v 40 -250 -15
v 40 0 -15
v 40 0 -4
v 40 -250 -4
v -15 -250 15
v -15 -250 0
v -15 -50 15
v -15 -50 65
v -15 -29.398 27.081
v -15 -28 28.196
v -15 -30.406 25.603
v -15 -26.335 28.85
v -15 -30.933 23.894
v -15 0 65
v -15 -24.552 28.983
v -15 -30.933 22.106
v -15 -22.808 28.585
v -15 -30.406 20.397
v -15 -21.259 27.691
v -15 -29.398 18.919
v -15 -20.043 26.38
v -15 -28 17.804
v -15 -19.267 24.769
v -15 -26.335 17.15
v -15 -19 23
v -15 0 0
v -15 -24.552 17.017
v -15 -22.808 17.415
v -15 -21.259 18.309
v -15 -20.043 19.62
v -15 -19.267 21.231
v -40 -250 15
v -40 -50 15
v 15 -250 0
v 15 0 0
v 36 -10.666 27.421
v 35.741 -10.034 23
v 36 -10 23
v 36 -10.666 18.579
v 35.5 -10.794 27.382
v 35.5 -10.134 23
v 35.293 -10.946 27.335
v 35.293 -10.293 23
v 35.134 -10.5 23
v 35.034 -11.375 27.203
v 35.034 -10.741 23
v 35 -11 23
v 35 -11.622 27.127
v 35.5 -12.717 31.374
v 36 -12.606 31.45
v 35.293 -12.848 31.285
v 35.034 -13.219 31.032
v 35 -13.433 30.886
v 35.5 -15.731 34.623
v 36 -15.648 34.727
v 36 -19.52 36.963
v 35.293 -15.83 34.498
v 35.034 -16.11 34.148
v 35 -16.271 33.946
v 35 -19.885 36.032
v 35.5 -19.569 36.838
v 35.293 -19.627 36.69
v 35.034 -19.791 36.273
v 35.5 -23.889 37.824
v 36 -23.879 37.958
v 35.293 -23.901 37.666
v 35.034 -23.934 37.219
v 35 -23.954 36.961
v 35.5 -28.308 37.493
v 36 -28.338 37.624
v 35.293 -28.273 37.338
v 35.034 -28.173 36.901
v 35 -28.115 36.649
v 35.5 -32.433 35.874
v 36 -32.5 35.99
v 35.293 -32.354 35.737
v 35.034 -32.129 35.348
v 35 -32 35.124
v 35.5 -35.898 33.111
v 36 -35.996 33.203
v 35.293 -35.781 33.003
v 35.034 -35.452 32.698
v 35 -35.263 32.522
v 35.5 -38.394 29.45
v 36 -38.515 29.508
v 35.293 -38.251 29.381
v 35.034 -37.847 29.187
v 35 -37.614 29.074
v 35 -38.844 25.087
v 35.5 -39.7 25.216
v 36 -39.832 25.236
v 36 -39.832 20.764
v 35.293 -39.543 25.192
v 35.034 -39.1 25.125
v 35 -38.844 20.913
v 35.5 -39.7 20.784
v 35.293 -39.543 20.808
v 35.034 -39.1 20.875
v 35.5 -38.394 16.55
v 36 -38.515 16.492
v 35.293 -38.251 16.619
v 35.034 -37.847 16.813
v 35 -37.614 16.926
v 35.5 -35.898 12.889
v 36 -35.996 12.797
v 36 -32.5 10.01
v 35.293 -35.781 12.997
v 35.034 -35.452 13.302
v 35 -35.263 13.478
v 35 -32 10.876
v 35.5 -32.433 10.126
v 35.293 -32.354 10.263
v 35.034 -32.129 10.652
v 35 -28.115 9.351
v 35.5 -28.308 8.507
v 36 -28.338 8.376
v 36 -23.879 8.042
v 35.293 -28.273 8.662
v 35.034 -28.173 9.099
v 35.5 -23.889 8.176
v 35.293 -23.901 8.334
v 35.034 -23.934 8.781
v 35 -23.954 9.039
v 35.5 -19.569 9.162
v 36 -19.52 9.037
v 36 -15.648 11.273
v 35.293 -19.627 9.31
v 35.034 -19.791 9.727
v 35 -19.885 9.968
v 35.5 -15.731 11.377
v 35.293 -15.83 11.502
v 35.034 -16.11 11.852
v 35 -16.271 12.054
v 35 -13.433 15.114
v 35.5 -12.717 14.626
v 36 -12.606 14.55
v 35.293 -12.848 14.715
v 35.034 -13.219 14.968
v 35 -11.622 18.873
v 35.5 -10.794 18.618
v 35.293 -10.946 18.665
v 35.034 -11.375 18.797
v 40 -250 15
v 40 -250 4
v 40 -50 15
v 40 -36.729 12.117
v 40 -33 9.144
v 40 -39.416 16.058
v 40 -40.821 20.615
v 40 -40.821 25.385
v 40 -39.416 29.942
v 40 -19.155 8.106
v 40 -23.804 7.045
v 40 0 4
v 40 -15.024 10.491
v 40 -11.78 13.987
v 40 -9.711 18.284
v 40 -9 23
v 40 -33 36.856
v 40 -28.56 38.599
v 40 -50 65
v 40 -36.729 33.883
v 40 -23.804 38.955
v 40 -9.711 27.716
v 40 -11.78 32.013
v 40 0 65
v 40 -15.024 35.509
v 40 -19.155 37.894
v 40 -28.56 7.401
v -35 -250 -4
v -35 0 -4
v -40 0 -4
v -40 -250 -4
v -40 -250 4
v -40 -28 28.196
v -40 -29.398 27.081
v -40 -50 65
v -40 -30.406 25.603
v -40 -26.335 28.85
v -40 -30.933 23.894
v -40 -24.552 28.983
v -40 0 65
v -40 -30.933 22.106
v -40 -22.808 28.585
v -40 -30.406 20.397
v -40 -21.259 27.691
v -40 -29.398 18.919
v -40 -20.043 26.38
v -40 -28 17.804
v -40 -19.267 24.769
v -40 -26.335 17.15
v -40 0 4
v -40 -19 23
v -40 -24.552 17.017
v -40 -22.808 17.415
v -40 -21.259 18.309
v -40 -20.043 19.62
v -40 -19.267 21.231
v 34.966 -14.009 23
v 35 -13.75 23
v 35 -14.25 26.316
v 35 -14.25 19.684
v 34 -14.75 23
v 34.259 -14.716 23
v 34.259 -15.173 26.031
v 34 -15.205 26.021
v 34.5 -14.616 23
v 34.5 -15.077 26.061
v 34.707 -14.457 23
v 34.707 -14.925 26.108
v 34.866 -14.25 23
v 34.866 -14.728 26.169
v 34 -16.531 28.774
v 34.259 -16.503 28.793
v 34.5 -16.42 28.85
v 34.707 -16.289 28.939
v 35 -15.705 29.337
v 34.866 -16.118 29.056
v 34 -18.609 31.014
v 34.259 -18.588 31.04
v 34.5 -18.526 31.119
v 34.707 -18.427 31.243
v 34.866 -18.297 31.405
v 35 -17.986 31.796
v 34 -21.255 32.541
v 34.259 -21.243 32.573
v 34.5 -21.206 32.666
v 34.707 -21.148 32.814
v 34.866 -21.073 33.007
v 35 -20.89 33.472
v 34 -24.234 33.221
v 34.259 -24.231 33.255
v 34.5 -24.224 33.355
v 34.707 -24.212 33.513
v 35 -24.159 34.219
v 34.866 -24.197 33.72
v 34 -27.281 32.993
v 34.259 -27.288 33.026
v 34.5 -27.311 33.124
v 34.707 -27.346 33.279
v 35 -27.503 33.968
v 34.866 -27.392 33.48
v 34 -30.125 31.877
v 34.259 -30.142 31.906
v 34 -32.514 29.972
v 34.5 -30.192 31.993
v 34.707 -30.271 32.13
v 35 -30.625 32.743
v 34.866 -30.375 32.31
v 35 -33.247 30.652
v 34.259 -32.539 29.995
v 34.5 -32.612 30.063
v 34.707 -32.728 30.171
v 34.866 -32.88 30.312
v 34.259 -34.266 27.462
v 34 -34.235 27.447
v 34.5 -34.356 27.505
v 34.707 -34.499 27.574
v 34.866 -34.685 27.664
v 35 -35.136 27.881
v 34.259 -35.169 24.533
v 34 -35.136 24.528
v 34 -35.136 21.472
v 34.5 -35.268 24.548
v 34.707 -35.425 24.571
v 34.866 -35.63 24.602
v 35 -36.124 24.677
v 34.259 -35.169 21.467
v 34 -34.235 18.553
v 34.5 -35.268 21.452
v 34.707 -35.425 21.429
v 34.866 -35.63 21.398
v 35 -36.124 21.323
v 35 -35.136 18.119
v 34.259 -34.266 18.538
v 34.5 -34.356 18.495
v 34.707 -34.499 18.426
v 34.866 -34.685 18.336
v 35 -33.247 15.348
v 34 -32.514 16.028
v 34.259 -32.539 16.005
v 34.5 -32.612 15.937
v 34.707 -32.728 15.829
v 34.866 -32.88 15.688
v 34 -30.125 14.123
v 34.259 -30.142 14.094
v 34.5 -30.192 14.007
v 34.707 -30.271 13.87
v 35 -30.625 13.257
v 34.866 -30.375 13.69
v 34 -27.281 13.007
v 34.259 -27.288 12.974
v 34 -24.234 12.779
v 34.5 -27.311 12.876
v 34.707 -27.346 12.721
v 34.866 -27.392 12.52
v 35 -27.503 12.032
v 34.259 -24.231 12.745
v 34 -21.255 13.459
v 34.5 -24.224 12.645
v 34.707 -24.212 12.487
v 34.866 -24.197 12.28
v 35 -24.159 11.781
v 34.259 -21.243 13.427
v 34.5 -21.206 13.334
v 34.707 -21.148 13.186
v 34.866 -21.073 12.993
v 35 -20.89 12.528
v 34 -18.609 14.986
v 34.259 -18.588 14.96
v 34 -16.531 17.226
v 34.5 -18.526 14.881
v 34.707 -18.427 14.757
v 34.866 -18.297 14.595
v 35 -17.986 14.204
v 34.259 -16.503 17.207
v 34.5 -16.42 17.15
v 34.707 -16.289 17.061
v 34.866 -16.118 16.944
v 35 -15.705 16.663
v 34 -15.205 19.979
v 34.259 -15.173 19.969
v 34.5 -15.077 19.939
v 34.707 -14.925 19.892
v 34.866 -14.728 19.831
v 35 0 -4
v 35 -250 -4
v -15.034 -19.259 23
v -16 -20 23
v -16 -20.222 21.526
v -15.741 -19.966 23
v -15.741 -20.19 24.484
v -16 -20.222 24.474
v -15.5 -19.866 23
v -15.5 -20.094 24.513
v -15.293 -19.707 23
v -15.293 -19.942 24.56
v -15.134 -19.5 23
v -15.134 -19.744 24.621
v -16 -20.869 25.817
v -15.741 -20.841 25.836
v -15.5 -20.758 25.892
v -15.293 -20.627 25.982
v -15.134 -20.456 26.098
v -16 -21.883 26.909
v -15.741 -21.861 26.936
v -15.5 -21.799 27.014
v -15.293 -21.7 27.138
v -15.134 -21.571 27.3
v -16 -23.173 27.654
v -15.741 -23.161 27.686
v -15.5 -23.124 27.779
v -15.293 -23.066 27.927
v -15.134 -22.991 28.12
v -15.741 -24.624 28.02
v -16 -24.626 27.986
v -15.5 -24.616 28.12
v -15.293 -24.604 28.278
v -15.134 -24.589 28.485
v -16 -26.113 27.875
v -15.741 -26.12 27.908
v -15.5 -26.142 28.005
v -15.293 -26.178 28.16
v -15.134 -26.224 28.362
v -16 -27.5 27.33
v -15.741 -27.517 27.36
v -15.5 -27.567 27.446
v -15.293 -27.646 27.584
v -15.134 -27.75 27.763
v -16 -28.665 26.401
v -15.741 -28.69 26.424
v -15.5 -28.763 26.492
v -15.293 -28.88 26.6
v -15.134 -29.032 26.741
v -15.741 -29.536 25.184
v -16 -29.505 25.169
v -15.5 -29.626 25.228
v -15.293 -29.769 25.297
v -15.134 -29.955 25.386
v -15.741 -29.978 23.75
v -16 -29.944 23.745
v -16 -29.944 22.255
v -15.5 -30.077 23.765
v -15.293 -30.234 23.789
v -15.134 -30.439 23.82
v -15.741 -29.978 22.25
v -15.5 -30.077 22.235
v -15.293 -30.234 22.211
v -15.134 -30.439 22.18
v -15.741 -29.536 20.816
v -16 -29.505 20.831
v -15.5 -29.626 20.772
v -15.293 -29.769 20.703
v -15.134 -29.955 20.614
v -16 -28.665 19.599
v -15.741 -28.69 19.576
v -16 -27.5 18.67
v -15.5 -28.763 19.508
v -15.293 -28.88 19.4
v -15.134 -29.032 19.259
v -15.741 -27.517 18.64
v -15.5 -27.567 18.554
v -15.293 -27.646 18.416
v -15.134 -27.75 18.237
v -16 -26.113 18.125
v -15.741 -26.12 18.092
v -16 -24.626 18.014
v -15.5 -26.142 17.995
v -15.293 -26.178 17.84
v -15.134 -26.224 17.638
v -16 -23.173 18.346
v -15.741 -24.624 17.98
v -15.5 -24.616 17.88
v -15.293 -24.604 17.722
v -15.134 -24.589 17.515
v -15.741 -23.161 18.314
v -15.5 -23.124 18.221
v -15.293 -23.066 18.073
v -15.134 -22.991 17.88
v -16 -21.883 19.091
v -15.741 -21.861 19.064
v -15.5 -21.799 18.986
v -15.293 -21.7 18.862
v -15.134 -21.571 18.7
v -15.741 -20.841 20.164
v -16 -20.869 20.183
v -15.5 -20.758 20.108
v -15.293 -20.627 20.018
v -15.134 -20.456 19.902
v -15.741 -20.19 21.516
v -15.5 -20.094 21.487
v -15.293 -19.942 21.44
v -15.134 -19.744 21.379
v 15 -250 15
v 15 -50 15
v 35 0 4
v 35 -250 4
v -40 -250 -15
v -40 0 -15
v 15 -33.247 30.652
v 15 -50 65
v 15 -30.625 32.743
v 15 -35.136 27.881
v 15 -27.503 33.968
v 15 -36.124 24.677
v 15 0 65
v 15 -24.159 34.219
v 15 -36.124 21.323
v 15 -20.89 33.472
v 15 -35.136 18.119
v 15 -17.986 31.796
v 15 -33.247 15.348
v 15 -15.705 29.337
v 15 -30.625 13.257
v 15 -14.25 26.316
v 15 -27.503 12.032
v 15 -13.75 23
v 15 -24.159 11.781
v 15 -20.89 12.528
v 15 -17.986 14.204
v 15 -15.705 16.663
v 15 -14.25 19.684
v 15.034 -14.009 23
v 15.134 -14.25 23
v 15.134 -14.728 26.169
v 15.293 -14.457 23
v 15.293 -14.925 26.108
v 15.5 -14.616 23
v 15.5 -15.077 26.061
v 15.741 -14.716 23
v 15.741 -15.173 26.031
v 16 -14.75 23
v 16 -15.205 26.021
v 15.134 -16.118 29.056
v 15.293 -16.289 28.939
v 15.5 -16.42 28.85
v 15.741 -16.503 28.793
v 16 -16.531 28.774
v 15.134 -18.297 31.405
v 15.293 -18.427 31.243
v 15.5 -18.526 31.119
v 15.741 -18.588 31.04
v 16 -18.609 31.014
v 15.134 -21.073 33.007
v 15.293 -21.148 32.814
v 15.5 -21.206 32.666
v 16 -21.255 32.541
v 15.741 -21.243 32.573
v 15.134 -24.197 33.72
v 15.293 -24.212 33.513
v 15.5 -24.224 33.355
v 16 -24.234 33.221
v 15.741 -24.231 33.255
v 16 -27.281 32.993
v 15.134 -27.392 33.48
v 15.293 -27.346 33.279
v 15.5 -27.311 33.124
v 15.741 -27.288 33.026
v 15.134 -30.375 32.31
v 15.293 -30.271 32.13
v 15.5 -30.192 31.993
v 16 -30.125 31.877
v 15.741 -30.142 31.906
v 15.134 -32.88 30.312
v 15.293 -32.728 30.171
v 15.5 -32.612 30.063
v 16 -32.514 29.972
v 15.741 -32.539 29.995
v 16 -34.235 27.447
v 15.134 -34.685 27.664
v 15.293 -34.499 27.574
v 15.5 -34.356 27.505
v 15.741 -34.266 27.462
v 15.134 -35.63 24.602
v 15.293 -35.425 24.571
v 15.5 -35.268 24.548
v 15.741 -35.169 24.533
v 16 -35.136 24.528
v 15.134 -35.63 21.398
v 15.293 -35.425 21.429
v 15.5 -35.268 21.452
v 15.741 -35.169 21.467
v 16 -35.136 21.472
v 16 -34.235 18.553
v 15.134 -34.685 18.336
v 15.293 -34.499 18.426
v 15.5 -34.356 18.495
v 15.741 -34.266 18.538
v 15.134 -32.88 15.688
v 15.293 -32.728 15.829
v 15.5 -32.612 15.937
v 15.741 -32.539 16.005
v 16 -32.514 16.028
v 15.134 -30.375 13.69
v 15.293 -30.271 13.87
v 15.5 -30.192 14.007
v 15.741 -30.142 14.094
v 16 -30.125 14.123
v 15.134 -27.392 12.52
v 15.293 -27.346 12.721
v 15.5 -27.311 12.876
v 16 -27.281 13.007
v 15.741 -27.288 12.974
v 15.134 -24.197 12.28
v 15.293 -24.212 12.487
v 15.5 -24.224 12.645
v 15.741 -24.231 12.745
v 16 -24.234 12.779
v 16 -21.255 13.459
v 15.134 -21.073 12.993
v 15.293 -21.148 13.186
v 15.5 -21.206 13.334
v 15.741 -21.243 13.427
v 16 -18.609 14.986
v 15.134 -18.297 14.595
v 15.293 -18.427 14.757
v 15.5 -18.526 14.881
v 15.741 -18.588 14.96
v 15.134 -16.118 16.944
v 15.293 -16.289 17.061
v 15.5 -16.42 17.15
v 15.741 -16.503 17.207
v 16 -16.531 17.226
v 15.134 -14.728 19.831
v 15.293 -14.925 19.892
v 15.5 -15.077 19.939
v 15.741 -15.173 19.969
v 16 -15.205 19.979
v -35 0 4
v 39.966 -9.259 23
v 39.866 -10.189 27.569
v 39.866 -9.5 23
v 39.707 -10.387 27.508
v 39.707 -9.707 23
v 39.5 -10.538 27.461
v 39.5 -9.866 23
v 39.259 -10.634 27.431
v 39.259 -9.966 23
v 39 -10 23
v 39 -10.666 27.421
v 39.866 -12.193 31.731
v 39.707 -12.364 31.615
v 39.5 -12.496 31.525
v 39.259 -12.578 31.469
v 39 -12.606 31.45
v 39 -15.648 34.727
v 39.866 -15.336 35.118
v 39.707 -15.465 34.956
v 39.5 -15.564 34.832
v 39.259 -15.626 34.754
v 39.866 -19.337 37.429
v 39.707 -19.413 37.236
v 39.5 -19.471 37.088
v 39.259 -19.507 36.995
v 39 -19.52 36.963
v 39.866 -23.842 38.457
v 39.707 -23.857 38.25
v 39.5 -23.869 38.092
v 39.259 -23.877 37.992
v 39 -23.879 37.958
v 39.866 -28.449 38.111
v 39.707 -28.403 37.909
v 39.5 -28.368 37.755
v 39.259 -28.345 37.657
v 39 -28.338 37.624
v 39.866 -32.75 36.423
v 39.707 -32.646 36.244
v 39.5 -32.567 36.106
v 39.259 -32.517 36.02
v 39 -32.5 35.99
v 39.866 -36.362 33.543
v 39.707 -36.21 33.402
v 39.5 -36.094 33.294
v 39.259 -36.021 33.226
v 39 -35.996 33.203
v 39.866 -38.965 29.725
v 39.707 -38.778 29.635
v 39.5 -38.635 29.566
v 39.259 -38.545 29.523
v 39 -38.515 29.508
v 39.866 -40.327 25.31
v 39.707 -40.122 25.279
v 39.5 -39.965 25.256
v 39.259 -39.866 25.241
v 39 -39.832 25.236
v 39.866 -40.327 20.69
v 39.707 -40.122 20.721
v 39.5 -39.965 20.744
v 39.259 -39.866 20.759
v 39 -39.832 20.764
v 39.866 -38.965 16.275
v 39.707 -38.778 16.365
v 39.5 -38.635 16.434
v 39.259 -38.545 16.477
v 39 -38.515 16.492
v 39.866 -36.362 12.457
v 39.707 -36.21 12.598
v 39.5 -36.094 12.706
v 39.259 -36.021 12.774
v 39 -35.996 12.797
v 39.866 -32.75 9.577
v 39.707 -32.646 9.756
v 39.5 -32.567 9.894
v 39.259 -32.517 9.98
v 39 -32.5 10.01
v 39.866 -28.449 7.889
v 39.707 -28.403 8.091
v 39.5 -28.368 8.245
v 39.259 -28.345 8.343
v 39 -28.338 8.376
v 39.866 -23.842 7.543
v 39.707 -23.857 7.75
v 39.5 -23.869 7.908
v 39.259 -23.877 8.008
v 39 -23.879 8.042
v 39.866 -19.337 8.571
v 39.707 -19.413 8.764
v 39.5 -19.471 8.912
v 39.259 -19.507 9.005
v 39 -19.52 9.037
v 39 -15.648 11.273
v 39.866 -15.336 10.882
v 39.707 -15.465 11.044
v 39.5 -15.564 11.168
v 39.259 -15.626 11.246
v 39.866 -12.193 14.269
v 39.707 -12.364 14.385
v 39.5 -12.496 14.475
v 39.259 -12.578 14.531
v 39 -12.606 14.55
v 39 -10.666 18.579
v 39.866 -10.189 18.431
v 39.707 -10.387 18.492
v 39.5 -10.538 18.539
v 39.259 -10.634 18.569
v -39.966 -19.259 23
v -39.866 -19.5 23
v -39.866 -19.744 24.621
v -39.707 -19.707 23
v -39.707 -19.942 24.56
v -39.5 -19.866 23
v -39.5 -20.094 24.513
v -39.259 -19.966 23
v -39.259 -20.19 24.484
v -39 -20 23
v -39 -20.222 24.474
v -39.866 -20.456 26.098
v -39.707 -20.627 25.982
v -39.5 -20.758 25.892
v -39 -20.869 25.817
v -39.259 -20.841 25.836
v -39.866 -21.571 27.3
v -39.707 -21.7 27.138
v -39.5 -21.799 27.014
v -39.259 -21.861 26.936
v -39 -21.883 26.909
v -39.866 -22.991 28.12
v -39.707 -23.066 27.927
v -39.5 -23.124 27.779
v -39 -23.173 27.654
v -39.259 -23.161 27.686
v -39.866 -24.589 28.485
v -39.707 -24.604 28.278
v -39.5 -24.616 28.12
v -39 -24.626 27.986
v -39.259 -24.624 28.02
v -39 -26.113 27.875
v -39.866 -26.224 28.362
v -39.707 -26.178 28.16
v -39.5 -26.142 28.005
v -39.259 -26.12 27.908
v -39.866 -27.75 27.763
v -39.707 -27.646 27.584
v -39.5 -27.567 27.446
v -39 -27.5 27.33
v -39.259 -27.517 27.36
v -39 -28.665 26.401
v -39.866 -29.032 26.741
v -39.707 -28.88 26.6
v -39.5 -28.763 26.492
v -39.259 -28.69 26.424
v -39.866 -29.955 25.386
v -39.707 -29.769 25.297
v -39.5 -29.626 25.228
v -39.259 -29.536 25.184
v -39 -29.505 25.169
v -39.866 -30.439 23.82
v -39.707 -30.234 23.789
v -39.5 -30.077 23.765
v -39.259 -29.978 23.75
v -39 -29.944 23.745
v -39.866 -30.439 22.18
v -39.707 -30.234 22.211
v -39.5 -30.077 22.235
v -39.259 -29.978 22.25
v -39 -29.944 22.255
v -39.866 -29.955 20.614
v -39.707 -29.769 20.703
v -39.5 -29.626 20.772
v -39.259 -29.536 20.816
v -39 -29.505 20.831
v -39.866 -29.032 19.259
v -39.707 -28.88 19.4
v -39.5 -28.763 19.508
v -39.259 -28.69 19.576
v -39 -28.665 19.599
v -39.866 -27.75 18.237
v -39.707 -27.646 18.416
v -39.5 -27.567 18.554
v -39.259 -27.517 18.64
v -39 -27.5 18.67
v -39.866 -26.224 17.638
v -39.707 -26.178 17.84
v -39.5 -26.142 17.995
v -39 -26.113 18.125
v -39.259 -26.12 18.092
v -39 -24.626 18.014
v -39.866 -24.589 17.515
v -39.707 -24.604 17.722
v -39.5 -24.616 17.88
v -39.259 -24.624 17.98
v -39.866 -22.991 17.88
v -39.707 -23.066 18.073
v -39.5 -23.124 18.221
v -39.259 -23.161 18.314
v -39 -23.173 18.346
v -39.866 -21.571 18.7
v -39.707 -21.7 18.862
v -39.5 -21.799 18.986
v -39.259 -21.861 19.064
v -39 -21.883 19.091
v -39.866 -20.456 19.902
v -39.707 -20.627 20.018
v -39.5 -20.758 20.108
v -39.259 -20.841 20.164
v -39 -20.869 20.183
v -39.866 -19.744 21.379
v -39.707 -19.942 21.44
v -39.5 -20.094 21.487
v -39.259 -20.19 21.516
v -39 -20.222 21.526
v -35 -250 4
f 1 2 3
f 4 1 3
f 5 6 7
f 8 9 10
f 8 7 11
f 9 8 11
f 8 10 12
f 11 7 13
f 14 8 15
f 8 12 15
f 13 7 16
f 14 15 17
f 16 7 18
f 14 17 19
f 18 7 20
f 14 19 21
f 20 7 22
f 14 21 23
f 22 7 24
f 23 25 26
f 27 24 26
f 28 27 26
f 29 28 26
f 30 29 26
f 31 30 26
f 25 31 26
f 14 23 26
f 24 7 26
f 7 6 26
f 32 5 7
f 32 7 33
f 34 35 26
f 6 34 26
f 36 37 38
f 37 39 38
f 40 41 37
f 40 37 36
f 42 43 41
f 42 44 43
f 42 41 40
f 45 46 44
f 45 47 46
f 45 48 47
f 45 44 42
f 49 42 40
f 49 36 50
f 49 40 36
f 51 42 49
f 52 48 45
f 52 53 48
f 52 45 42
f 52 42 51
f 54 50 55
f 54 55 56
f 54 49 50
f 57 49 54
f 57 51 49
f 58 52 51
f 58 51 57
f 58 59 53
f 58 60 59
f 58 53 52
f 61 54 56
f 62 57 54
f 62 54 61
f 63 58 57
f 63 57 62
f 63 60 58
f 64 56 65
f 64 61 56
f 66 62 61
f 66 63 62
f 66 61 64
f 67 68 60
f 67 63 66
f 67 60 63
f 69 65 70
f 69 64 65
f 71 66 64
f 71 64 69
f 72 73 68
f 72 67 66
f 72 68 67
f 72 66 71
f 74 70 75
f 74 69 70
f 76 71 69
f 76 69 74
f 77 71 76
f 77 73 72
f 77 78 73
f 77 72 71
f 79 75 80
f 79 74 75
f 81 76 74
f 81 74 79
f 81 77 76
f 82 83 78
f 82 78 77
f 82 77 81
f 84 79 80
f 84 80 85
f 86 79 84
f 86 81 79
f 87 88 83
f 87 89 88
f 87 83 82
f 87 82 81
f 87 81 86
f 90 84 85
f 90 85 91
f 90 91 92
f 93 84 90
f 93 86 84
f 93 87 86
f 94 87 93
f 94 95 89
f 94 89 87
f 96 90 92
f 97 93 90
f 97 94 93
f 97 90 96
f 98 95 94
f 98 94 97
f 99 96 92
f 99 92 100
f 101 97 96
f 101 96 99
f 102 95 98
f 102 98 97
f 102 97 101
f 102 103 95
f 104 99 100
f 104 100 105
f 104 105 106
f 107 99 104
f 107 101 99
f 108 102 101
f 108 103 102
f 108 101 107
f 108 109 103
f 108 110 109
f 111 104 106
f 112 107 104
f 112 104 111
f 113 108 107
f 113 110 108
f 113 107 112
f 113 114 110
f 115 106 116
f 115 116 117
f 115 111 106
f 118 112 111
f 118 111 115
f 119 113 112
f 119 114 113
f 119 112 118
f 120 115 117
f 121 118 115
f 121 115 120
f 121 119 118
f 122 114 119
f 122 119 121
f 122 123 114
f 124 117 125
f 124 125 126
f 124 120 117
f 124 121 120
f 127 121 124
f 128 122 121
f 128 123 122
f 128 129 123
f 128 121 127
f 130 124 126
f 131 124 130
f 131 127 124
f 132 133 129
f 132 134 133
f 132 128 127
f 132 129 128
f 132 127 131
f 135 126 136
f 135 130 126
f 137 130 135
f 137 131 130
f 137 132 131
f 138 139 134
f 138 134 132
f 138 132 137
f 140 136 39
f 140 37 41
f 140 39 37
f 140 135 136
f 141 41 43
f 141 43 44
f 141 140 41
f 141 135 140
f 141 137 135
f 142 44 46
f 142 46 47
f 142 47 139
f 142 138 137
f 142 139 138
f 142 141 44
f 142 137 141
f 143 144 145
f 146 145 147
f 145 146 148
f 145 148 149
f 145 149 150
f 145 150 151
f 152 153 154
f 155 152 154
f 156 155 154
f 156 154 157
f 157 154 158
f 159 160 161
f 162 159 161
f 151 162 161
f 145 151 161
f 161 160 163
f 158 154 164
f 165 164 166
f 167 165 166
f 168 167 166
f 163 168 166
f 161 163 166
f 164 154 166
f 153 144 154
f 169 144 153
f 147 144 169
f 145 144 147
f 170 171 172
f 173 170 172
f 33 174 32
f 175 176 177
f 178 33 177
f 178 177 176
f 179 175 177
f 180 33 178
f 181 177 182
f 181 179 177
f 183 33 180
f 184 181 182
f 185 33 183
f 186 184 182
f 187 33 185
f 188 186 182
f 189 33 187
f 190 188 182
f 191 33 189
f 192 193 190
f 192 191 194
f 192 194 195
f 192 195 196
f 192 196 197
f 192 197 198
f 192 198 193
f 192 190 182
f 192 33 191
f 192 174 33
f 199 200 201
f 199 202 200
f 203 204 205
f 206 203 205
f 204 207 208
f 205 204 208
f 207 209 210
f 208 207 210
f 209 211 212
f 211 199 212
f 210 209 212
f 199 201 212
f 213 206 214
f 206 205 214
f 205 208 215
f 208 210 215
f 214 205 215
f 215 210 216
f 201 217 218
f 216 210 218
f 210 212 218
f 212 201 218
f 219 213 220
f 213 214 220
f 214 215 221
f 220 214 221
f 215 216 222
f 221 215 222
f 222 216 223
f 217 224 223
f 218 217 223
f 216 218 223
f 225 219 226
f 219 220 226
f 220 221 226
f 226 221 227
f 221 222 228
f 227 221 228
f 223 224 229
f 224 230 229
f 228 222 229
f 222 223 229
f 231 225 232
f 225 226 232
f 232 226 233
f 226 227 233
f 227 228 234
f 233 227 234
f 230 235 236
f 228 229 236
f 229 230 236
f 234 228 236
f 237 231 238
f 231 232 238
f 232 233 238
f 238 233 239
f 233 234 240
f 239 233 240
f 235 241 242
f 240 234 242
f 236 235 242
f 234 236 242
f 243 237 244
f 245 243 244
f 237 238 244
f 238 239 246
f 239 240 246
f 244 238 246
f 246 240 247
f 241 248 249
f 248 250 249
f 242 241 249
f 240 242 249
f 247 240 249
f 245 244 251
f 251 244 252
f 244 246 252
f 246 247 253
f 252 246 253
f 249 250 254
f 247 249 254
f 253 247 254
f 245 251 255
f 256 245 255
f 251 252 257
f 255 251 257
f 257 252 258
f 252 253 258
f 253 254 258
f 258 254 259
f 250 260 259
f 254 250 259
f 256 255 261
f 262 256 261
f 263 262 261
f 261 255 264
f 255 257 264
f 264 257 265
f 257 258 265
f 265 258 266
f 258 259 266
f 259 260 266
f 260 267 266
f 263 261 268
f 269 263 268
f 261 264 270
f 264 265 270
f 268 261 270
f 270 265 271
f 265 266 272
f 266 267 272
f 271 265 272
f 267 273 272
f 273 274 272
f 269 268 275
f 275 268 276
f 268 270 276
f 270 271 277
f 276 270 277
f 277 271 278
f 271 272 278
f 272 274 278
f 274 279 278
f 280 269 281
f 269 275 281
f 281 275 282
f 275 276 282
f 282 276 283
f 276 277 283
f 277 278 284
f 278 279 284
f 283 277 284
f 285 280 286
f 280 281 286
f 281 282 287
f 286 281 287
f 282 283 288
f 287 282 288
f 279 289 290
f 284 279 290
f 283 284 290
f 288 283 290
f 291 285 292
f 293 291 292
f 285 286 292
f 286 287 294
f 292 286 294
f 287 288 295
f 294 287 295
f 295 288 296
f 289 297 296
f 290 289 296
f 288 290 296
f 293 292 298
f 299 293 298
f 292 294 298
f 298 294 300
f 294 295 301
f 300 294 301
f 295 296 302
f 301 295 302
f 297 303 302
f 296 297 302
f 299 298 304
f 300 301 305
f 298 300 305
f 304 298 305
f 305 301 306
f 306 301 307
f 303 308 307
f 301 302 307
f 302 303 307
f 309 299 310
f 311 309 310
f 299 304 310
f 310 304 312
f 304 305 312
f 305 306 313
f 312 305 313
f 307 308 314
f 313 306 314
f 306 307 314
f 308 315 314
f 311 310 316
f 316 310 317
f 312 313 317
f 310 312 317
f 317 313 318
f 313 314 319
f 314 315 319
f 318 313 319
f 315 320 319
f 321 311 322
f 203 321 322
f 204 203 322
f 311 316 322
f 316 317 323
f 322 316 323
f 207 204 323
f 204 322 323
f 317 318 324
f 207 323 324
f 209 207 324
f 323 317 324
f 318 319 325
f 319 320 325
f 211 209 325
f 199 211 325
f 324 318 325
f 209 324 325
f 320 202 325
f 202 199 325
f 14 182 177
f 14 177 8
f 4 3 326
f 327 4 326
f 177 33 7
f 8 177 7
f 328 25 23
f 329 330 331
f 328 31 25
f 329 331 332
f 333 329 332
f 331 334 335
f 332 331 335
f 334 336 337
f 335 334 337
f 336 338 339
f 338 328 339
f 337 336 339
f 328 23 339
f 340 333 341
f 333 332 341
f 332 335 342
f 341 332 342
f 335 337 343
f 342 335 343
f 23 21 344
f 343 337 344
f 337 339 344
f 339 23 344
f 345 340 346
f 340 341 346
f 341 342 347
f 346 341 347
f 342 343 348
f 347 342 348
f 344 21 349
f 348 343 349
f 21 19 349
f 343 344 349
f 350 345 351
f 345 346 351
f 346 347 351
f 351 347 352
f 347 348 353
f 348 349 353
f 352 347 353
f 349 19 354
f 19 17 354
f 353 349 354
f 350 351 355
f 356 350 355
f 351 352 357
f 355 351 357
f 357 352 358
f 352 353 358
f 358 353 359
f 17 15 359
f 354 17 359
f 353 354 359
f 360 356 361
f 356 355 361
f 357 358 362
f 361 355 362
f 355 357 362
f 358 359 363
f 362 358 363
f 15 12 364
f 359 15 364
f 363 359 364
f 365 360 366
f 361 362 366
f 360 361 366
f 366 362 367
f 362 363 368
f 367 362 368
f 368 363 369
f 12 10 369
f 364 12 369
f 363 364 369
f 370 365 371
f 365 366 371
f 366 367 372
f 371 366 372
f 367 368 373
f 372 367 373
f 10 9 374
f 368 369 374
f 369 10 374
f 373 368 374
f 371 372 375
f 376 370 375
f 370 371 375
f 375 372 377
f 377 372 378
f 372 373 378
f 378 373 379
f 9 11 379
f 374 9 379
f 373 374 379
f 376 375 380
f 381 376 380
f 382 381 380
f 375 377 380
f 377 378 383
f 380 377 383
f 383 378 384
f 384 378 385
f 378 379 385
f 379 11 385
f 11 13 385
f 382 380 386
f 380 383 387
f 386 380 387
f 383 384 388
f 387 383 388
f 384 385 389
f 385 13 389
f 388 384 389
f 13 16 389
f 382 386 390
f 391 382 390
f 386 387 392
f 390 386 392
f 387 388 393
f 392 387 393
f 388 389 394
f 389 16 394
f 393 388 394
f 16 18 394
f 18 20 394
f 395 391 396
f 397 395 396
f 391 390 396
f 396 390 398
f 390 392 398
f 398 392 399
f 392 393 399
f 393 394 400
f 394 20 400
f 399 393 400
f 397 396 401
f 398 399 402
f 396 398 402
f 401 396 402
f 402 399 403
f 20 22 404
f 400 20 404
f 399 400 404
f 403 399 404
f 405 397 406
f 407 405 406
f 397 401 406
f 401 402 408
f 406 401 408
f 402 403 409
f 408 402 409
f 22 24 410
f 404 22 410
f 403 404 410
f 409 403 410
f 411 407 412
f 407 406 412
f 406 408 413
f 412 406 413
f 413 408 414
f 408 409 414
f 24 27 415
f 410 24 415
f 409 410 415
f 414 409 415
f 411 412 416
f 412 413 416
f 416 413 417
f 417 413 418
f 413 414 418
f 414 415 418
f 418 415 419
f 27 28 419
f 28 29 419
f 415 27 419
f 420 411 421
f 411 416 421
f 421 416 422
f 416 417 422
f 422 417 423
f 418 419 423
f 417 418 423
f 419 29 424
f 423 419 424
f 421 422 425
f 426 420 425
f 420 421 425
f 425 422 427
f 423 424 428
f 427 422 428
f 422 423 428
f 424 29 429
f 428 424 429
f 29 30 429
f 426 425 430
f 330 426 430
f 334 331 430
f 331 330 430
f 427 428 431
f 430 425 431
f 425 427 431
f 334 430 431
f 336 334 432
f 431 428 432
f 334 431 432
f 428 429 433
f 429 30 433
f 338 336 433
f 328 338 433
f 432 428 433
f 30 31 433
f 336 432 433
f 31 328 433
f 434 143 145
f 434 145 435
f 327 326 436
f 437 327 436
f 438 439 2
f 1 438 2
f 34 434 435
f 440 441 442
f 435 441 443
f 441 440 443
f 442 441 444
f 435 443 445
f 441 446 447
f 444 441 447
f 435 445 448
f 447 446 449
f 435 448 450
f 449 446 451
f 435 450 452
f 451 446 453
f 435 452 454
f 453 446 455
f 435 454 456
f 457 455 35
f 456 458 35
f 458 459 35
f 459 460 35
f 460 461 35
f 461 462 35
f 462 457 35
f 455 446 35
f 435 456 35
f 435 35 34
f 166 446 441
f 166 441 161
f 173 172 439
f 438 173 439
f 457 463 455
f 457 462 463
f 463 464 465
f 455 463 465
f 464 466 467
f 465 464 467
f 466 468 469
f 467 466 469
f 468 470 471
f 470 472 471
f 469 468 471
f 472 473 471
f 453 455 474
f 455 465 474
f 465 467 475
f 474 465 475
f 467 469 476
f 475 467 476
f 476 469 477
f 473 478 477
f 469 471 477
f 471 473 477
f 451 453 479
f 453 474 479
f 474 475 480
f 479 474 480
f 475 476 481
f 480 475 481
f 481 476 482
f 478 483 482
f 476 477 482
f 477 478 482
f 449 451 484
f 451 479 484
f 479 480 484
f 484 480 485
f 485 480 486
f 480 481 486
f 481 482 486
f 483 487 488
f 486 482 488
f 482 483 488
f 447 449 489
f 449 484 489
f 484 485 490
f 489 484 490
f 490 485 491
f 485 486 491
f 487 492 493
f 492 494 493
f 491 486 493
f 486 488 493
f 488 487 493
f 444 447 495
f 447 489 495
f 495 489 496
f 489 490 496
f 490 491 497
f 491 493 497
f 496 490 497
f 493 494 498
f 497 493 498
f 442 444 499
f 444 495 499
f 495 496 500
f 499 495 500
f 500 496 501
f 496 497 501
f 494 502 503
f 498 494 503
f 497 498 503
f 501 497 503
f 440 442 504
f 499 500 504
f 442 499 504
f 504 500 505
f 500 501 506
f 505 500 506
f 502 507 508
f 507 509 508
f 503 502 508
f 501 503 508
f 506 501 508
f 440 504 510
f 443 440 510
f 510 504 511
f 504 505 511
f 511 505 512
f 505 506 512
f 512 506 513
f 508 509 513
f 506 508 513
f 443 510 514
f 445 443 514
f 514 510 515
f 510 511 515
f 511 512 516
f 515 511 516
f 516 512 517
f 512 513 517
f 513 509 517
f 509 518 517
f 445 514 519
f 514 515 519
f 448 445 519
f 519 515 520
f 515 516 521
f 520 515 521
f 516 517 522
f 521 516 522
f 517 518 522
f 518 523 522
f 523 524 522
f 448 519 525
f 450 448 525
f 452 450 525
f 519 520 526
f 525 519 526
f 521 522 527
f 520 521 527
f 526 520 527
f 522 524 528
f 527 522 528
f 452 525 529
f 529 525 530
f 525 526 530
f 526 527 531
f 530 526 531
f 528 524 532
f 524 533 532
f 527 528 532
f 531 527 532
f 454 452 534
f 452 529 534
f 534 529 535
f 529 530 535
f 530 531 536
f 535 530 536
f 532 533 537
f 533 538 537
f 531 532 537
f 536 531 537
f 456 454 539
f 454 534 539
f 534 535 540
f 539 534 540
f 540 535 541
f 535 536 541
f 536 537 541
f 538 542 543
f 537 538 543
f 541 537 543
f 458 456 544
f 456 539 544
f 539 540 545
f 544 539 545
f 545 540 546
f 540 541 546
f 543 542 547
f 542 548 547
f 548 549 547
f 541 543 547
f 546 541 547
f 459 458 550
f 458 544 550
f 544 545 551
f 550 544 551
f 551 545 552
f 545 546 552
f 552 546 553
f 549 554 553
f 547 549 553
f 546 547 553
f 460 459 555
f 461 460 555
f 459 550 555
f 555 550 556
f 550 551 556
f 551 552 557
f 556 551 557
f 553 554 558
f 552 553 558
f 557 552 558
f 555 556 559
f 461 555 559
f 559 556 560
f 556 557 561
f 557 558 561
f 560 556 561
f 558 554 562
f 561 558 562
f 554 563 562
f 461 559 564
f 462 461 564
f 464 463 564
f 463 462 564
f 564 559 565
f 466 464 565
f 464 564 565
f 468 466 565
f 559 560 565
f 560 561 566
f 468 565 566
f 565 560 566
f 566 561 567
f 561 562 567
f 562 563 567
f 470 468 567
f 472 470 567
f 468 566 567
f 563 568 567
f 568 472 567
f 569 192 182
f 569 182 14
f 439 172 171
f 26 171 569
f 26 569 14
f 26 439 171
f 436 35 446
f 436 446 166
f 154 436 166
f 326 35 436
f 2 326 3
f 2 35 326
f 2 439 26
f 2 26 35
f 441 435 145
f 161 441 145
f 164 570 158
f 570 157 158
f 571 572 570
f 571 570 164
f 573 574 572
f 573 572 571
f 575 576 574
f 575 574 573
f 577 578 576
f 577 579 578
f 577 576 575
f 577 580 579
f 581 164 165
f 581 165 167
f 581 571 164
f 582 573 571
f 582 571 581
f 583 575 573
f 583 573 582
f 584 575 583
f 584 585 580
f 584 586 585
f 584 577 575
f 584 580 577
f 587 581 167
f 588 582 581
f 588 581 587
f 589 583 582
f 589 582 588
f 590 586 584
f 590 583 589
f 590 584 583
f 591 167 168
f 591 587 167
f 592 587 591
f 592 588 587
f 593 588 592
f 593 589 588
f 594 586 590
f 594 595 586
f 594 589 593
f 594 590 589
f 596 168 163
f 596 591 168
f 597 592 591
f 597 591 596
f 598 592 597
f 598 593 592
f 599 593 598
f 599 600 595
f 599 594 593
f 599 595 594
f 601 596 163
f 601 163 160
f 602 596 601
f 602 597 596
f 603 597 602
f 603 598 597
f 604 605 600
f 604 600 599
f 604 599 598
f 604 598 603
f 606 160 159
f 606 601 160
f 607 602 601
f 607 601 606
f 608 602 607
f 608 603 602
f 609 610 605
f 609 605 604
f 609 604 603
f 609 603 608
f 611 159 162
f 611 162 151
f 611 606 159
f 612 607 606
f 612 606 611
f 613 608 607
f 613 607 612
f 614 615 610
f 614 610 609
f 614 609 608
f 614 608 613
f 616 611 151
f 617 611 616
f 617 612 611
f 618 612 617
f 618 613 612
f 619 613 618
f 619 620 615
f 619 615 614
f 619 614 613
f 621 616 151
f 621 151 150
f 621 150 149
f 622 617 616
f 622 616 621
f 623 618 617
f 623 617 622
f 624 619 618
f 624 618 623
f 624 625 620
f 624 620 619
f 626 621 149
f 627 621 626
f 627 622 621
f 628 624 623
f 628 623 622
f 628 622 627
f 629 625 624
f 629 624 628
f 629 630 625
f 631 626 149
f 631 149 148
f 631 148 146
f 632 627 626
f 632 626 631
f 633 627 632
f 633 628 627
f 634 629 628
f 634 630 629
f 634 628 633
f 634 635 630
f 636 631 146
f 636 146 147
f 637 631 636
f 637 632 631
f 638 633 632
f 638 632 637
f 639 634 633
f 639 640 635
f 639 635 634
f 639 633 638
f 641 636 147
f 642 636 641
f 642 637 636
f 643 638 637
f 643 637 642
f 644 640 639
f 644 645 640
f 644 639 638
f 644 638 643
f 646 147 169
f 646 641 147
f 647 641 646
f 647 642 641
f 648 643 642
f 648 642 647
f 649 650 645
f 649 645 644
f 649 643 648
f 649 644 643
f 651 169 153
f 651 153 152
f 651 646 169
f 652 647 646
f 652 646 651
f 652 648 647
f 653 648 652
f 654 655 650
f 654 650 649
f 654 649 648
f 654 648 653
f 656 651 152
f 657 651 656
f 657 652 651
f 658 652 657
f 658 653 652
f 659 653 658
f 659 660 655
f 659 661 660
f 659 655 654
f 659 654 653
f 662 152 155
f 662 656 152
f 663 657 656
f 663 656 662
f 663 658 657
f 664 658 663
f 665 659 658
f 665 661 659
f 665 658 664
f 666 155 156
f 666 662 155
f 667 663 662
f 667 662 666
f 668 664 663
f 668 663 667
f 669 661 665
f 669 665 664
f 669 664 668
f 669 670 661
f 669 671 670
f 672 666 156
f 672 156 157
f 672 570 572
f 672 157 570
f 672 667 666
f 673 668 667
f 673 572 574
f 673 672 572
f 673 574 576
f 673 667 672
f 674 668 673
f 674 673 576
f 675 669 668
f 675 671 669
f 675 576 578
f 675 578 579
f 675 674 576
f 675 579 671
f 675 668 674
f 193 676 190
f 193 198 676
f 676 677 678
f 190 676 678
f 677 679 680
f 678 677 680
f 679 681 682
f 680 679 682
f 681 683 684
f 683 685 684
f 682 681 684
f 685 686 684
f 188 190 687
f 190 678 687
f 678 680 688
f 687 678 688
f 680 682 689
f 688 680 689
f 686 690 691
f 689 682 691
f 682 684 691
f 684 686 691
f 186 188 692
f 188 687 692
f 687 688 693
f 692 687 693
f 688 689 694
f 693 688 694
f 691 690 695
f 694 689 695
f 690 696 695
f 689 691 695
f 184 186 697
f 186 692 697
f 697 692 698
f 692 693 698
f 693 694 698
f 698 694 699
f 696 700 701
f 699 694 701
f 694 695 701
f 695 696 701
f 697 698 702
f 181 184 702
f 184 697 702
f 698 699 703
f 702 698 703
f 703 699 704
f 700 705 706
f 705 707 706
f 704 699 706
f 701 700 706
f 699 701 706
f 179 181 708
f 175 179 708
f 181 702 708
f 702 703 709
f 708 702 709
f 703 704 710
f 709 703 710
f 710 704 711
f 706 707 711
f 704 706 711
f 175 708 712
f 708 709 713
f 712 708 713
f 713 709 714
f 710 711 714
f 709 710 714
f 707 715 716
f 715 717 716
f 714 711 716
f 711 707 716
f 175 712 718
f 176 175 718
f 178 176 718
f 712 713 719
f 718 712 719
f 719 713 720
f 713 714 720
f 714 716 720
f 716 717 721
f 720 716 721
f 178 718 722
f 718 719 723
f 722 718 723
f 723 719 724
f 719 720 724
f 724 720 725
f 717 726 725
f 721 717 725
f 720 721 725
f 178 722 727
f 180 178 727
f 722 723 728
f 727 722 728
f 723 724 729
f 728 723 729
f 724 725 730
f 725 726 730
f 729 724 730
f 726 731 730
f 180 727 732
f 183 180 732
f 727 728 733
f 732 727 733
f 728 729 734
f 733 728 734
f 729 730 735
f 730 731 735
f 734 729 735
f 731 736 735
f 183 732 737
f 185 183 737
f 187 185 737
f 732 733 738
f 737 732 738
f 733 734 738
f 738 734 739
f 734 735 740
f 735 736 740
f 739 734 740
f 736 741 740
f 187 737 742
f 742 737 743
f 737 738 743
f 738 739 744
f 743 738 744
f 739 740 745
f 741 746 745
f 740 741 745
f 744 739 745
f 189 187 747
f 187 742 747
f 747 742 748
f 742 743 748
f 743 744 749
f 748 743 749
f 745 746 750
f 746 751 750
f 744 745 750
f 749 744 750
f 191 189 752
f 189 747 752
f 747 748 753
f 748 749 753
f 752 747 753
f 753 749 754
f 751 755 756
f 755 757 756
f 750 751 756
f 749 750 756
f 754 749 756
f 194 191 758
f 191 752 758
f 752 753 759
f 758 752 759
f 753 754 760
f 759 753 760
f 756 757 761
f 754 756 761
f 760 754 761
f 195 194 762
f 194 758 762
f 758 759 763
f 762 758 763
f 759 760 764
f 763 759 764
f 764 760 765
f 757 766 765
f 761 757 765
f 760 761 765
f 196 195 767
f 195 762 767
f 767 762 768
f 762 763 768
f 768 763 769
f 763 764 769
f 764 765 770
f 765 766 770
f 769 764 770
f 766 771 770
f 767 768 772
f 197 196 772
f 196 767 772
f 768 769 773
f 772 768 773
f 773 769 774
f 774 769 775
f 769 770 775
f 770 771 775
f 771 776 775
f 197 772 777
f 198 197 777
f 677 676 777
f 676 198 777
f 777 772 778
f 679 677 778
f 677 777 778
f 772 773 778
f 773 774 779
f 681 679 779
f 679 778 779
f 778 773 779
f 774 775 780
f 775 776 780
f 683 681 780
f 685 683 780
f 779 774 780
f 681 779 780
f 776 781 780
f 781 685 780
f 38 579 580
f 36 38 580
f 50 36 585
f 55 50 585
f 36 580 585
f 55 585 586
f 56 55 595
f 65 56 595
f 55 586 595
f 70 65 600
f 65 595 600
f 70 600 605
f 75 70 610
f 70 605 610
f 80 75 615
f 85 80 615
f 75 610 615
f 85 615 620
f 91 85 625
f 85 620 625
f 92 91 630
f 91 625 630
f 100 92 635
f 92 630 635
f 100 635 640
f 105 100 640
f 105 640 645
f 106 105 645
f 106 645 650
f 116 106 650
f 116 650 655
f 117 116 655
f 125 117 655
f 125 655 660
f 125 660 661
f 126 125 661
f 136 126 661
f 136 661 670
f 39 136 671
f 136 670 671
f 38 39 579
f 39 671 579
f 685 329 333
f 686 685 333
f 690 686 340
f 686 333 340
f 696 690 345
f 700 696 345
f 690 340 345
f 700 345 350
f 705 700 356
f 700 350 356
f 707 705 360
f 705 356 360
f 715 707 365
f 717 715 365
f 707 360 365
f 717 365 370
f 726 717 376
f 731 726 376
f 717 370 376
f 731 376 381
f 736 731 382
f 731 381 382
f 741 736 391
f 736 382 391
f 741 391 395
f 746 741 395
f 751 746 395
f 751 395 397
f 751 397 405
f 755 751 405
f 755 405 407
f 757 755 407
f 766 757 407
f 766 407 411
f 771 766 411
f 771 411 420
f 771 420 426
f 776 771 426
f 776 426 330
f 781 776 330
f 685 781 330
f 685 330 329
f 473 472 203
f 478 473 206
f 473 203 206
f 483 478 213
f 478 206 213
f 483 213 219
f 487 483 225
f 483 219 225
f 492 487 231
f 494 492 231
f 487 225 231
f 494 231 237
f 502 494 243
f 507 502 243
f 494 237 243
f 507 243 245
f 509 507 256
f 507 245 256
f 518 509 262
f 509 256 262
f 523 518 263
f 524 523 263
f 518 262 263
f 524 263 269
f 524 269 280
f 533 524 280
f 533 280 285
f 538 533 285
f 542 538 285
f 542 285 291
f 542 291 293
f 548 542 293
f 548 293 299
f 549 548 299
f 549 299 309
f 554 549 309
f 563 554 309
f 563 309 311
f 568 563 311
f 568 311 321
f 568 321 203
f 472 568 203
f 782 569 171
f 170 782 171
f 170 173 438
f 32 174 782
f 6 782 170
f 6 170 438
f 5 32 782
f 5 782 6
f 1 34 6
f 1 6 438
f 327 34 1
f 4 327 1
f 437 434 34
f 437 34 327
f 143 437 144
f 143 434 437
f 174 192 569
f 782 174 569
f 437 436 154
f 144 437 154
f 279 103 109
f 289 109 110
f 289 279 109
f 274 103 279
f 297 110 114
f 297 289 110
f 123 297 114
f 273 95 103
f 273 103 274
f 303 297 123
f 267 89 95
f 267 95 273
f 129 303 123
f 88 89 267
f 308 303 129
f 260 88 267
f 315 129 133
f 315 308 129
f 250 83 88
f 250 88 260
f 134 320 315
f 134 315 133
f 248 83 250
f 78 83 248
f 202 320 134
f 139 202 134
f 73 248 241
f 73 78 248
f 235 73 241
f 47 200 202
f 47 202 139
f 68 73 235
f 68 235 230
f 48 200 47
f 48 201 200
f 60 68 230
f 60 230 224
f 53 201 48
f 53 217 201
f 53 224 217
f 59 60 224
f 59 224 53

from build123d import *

# Parameters (mm, degrees)
F1_DEPTH = 250
F2_W     = 25
F2_H     = 50
F3_DEPTH = 50
F4_R     = 5
F5_DEPTH = 100
F4_R_2   = 10.25
F6_DEPTH = 25.8
F4_R_3   = 15
F7_DEPTH = 5
F8_R     = 1


with BuildPart() as f1:
    # F0 (on Front) → F1 (new body)
    with BuildSketch(Plane.XZ):
        Polygon((-40, -15), (40, -15), (40, -4), (35, -4), (35, 4), (40, 4), (40, 15), (15, 15), (15, 0), (-15, 0), (-15, 15), (-40, 15), (-40, 4), (-35, 4), (-35, -4), (-40, -4), align=None)
    extrude(amount=F1_DEPTH)

    # F2 (on face) → F3 (join)
    with BuildSketch(Plane.XY.offset(15)):
        with Locations((-27.5, -25)):
            Rectangle(F2_W, F2_H)
        with Locations((27.5, -25)):
            Rectangle(F2_W, F2_H)
    extrude(amount=F3_DEPTH)

    # F4 (on face) → F5 (cut)
    with BuildSketch(Plane.YZ.offset(40)):
        with Locations((-25, 23)):
            Circle(F4_R)
    extrude(amount=-F5_DEPTH, mode=Mode.SUBTRACT)

    # F4 (on face) → F6 (cut)
    with BuildSketch(Plane.YZ.offset(40)):
        with Locations((-25, 23)):
            Circle(F4_R_2)
        with Locations((-25, 23)):
            Circle(F4_R, mode=Mode.SUBTRACT)
    extrude(amount=-F6_DEPTH, mode=Mode.SUBTRACT)

    # F4 (on face) → F7 (cut)
    with BuildSketch(Plane.YZ.offset(40)):
        with Locations((-25, 23)):
            Circle(F4_R_3)
        with Locations((-25, 23)):
            Circle(F4_R_2, mode=Mode.SUBTRACT)
    extrude(amount=-F7_DEPTH, mode=Mode.SUBTRACT)

    # F8
    f8_edges = [f1.edges().sort_by_distance(p)[0] for p in [
        (35, -40, 23),
        (35, -35.25, 23),
        (15, -35.25, 23),
        (-15, -30, 23),
        (-27.5, -20, 23),
        (-40, -30, 23),
        (40, -40, 23),
    ]]
    fillet(f8_edges, radius=F8_R)


solid = f1.part
